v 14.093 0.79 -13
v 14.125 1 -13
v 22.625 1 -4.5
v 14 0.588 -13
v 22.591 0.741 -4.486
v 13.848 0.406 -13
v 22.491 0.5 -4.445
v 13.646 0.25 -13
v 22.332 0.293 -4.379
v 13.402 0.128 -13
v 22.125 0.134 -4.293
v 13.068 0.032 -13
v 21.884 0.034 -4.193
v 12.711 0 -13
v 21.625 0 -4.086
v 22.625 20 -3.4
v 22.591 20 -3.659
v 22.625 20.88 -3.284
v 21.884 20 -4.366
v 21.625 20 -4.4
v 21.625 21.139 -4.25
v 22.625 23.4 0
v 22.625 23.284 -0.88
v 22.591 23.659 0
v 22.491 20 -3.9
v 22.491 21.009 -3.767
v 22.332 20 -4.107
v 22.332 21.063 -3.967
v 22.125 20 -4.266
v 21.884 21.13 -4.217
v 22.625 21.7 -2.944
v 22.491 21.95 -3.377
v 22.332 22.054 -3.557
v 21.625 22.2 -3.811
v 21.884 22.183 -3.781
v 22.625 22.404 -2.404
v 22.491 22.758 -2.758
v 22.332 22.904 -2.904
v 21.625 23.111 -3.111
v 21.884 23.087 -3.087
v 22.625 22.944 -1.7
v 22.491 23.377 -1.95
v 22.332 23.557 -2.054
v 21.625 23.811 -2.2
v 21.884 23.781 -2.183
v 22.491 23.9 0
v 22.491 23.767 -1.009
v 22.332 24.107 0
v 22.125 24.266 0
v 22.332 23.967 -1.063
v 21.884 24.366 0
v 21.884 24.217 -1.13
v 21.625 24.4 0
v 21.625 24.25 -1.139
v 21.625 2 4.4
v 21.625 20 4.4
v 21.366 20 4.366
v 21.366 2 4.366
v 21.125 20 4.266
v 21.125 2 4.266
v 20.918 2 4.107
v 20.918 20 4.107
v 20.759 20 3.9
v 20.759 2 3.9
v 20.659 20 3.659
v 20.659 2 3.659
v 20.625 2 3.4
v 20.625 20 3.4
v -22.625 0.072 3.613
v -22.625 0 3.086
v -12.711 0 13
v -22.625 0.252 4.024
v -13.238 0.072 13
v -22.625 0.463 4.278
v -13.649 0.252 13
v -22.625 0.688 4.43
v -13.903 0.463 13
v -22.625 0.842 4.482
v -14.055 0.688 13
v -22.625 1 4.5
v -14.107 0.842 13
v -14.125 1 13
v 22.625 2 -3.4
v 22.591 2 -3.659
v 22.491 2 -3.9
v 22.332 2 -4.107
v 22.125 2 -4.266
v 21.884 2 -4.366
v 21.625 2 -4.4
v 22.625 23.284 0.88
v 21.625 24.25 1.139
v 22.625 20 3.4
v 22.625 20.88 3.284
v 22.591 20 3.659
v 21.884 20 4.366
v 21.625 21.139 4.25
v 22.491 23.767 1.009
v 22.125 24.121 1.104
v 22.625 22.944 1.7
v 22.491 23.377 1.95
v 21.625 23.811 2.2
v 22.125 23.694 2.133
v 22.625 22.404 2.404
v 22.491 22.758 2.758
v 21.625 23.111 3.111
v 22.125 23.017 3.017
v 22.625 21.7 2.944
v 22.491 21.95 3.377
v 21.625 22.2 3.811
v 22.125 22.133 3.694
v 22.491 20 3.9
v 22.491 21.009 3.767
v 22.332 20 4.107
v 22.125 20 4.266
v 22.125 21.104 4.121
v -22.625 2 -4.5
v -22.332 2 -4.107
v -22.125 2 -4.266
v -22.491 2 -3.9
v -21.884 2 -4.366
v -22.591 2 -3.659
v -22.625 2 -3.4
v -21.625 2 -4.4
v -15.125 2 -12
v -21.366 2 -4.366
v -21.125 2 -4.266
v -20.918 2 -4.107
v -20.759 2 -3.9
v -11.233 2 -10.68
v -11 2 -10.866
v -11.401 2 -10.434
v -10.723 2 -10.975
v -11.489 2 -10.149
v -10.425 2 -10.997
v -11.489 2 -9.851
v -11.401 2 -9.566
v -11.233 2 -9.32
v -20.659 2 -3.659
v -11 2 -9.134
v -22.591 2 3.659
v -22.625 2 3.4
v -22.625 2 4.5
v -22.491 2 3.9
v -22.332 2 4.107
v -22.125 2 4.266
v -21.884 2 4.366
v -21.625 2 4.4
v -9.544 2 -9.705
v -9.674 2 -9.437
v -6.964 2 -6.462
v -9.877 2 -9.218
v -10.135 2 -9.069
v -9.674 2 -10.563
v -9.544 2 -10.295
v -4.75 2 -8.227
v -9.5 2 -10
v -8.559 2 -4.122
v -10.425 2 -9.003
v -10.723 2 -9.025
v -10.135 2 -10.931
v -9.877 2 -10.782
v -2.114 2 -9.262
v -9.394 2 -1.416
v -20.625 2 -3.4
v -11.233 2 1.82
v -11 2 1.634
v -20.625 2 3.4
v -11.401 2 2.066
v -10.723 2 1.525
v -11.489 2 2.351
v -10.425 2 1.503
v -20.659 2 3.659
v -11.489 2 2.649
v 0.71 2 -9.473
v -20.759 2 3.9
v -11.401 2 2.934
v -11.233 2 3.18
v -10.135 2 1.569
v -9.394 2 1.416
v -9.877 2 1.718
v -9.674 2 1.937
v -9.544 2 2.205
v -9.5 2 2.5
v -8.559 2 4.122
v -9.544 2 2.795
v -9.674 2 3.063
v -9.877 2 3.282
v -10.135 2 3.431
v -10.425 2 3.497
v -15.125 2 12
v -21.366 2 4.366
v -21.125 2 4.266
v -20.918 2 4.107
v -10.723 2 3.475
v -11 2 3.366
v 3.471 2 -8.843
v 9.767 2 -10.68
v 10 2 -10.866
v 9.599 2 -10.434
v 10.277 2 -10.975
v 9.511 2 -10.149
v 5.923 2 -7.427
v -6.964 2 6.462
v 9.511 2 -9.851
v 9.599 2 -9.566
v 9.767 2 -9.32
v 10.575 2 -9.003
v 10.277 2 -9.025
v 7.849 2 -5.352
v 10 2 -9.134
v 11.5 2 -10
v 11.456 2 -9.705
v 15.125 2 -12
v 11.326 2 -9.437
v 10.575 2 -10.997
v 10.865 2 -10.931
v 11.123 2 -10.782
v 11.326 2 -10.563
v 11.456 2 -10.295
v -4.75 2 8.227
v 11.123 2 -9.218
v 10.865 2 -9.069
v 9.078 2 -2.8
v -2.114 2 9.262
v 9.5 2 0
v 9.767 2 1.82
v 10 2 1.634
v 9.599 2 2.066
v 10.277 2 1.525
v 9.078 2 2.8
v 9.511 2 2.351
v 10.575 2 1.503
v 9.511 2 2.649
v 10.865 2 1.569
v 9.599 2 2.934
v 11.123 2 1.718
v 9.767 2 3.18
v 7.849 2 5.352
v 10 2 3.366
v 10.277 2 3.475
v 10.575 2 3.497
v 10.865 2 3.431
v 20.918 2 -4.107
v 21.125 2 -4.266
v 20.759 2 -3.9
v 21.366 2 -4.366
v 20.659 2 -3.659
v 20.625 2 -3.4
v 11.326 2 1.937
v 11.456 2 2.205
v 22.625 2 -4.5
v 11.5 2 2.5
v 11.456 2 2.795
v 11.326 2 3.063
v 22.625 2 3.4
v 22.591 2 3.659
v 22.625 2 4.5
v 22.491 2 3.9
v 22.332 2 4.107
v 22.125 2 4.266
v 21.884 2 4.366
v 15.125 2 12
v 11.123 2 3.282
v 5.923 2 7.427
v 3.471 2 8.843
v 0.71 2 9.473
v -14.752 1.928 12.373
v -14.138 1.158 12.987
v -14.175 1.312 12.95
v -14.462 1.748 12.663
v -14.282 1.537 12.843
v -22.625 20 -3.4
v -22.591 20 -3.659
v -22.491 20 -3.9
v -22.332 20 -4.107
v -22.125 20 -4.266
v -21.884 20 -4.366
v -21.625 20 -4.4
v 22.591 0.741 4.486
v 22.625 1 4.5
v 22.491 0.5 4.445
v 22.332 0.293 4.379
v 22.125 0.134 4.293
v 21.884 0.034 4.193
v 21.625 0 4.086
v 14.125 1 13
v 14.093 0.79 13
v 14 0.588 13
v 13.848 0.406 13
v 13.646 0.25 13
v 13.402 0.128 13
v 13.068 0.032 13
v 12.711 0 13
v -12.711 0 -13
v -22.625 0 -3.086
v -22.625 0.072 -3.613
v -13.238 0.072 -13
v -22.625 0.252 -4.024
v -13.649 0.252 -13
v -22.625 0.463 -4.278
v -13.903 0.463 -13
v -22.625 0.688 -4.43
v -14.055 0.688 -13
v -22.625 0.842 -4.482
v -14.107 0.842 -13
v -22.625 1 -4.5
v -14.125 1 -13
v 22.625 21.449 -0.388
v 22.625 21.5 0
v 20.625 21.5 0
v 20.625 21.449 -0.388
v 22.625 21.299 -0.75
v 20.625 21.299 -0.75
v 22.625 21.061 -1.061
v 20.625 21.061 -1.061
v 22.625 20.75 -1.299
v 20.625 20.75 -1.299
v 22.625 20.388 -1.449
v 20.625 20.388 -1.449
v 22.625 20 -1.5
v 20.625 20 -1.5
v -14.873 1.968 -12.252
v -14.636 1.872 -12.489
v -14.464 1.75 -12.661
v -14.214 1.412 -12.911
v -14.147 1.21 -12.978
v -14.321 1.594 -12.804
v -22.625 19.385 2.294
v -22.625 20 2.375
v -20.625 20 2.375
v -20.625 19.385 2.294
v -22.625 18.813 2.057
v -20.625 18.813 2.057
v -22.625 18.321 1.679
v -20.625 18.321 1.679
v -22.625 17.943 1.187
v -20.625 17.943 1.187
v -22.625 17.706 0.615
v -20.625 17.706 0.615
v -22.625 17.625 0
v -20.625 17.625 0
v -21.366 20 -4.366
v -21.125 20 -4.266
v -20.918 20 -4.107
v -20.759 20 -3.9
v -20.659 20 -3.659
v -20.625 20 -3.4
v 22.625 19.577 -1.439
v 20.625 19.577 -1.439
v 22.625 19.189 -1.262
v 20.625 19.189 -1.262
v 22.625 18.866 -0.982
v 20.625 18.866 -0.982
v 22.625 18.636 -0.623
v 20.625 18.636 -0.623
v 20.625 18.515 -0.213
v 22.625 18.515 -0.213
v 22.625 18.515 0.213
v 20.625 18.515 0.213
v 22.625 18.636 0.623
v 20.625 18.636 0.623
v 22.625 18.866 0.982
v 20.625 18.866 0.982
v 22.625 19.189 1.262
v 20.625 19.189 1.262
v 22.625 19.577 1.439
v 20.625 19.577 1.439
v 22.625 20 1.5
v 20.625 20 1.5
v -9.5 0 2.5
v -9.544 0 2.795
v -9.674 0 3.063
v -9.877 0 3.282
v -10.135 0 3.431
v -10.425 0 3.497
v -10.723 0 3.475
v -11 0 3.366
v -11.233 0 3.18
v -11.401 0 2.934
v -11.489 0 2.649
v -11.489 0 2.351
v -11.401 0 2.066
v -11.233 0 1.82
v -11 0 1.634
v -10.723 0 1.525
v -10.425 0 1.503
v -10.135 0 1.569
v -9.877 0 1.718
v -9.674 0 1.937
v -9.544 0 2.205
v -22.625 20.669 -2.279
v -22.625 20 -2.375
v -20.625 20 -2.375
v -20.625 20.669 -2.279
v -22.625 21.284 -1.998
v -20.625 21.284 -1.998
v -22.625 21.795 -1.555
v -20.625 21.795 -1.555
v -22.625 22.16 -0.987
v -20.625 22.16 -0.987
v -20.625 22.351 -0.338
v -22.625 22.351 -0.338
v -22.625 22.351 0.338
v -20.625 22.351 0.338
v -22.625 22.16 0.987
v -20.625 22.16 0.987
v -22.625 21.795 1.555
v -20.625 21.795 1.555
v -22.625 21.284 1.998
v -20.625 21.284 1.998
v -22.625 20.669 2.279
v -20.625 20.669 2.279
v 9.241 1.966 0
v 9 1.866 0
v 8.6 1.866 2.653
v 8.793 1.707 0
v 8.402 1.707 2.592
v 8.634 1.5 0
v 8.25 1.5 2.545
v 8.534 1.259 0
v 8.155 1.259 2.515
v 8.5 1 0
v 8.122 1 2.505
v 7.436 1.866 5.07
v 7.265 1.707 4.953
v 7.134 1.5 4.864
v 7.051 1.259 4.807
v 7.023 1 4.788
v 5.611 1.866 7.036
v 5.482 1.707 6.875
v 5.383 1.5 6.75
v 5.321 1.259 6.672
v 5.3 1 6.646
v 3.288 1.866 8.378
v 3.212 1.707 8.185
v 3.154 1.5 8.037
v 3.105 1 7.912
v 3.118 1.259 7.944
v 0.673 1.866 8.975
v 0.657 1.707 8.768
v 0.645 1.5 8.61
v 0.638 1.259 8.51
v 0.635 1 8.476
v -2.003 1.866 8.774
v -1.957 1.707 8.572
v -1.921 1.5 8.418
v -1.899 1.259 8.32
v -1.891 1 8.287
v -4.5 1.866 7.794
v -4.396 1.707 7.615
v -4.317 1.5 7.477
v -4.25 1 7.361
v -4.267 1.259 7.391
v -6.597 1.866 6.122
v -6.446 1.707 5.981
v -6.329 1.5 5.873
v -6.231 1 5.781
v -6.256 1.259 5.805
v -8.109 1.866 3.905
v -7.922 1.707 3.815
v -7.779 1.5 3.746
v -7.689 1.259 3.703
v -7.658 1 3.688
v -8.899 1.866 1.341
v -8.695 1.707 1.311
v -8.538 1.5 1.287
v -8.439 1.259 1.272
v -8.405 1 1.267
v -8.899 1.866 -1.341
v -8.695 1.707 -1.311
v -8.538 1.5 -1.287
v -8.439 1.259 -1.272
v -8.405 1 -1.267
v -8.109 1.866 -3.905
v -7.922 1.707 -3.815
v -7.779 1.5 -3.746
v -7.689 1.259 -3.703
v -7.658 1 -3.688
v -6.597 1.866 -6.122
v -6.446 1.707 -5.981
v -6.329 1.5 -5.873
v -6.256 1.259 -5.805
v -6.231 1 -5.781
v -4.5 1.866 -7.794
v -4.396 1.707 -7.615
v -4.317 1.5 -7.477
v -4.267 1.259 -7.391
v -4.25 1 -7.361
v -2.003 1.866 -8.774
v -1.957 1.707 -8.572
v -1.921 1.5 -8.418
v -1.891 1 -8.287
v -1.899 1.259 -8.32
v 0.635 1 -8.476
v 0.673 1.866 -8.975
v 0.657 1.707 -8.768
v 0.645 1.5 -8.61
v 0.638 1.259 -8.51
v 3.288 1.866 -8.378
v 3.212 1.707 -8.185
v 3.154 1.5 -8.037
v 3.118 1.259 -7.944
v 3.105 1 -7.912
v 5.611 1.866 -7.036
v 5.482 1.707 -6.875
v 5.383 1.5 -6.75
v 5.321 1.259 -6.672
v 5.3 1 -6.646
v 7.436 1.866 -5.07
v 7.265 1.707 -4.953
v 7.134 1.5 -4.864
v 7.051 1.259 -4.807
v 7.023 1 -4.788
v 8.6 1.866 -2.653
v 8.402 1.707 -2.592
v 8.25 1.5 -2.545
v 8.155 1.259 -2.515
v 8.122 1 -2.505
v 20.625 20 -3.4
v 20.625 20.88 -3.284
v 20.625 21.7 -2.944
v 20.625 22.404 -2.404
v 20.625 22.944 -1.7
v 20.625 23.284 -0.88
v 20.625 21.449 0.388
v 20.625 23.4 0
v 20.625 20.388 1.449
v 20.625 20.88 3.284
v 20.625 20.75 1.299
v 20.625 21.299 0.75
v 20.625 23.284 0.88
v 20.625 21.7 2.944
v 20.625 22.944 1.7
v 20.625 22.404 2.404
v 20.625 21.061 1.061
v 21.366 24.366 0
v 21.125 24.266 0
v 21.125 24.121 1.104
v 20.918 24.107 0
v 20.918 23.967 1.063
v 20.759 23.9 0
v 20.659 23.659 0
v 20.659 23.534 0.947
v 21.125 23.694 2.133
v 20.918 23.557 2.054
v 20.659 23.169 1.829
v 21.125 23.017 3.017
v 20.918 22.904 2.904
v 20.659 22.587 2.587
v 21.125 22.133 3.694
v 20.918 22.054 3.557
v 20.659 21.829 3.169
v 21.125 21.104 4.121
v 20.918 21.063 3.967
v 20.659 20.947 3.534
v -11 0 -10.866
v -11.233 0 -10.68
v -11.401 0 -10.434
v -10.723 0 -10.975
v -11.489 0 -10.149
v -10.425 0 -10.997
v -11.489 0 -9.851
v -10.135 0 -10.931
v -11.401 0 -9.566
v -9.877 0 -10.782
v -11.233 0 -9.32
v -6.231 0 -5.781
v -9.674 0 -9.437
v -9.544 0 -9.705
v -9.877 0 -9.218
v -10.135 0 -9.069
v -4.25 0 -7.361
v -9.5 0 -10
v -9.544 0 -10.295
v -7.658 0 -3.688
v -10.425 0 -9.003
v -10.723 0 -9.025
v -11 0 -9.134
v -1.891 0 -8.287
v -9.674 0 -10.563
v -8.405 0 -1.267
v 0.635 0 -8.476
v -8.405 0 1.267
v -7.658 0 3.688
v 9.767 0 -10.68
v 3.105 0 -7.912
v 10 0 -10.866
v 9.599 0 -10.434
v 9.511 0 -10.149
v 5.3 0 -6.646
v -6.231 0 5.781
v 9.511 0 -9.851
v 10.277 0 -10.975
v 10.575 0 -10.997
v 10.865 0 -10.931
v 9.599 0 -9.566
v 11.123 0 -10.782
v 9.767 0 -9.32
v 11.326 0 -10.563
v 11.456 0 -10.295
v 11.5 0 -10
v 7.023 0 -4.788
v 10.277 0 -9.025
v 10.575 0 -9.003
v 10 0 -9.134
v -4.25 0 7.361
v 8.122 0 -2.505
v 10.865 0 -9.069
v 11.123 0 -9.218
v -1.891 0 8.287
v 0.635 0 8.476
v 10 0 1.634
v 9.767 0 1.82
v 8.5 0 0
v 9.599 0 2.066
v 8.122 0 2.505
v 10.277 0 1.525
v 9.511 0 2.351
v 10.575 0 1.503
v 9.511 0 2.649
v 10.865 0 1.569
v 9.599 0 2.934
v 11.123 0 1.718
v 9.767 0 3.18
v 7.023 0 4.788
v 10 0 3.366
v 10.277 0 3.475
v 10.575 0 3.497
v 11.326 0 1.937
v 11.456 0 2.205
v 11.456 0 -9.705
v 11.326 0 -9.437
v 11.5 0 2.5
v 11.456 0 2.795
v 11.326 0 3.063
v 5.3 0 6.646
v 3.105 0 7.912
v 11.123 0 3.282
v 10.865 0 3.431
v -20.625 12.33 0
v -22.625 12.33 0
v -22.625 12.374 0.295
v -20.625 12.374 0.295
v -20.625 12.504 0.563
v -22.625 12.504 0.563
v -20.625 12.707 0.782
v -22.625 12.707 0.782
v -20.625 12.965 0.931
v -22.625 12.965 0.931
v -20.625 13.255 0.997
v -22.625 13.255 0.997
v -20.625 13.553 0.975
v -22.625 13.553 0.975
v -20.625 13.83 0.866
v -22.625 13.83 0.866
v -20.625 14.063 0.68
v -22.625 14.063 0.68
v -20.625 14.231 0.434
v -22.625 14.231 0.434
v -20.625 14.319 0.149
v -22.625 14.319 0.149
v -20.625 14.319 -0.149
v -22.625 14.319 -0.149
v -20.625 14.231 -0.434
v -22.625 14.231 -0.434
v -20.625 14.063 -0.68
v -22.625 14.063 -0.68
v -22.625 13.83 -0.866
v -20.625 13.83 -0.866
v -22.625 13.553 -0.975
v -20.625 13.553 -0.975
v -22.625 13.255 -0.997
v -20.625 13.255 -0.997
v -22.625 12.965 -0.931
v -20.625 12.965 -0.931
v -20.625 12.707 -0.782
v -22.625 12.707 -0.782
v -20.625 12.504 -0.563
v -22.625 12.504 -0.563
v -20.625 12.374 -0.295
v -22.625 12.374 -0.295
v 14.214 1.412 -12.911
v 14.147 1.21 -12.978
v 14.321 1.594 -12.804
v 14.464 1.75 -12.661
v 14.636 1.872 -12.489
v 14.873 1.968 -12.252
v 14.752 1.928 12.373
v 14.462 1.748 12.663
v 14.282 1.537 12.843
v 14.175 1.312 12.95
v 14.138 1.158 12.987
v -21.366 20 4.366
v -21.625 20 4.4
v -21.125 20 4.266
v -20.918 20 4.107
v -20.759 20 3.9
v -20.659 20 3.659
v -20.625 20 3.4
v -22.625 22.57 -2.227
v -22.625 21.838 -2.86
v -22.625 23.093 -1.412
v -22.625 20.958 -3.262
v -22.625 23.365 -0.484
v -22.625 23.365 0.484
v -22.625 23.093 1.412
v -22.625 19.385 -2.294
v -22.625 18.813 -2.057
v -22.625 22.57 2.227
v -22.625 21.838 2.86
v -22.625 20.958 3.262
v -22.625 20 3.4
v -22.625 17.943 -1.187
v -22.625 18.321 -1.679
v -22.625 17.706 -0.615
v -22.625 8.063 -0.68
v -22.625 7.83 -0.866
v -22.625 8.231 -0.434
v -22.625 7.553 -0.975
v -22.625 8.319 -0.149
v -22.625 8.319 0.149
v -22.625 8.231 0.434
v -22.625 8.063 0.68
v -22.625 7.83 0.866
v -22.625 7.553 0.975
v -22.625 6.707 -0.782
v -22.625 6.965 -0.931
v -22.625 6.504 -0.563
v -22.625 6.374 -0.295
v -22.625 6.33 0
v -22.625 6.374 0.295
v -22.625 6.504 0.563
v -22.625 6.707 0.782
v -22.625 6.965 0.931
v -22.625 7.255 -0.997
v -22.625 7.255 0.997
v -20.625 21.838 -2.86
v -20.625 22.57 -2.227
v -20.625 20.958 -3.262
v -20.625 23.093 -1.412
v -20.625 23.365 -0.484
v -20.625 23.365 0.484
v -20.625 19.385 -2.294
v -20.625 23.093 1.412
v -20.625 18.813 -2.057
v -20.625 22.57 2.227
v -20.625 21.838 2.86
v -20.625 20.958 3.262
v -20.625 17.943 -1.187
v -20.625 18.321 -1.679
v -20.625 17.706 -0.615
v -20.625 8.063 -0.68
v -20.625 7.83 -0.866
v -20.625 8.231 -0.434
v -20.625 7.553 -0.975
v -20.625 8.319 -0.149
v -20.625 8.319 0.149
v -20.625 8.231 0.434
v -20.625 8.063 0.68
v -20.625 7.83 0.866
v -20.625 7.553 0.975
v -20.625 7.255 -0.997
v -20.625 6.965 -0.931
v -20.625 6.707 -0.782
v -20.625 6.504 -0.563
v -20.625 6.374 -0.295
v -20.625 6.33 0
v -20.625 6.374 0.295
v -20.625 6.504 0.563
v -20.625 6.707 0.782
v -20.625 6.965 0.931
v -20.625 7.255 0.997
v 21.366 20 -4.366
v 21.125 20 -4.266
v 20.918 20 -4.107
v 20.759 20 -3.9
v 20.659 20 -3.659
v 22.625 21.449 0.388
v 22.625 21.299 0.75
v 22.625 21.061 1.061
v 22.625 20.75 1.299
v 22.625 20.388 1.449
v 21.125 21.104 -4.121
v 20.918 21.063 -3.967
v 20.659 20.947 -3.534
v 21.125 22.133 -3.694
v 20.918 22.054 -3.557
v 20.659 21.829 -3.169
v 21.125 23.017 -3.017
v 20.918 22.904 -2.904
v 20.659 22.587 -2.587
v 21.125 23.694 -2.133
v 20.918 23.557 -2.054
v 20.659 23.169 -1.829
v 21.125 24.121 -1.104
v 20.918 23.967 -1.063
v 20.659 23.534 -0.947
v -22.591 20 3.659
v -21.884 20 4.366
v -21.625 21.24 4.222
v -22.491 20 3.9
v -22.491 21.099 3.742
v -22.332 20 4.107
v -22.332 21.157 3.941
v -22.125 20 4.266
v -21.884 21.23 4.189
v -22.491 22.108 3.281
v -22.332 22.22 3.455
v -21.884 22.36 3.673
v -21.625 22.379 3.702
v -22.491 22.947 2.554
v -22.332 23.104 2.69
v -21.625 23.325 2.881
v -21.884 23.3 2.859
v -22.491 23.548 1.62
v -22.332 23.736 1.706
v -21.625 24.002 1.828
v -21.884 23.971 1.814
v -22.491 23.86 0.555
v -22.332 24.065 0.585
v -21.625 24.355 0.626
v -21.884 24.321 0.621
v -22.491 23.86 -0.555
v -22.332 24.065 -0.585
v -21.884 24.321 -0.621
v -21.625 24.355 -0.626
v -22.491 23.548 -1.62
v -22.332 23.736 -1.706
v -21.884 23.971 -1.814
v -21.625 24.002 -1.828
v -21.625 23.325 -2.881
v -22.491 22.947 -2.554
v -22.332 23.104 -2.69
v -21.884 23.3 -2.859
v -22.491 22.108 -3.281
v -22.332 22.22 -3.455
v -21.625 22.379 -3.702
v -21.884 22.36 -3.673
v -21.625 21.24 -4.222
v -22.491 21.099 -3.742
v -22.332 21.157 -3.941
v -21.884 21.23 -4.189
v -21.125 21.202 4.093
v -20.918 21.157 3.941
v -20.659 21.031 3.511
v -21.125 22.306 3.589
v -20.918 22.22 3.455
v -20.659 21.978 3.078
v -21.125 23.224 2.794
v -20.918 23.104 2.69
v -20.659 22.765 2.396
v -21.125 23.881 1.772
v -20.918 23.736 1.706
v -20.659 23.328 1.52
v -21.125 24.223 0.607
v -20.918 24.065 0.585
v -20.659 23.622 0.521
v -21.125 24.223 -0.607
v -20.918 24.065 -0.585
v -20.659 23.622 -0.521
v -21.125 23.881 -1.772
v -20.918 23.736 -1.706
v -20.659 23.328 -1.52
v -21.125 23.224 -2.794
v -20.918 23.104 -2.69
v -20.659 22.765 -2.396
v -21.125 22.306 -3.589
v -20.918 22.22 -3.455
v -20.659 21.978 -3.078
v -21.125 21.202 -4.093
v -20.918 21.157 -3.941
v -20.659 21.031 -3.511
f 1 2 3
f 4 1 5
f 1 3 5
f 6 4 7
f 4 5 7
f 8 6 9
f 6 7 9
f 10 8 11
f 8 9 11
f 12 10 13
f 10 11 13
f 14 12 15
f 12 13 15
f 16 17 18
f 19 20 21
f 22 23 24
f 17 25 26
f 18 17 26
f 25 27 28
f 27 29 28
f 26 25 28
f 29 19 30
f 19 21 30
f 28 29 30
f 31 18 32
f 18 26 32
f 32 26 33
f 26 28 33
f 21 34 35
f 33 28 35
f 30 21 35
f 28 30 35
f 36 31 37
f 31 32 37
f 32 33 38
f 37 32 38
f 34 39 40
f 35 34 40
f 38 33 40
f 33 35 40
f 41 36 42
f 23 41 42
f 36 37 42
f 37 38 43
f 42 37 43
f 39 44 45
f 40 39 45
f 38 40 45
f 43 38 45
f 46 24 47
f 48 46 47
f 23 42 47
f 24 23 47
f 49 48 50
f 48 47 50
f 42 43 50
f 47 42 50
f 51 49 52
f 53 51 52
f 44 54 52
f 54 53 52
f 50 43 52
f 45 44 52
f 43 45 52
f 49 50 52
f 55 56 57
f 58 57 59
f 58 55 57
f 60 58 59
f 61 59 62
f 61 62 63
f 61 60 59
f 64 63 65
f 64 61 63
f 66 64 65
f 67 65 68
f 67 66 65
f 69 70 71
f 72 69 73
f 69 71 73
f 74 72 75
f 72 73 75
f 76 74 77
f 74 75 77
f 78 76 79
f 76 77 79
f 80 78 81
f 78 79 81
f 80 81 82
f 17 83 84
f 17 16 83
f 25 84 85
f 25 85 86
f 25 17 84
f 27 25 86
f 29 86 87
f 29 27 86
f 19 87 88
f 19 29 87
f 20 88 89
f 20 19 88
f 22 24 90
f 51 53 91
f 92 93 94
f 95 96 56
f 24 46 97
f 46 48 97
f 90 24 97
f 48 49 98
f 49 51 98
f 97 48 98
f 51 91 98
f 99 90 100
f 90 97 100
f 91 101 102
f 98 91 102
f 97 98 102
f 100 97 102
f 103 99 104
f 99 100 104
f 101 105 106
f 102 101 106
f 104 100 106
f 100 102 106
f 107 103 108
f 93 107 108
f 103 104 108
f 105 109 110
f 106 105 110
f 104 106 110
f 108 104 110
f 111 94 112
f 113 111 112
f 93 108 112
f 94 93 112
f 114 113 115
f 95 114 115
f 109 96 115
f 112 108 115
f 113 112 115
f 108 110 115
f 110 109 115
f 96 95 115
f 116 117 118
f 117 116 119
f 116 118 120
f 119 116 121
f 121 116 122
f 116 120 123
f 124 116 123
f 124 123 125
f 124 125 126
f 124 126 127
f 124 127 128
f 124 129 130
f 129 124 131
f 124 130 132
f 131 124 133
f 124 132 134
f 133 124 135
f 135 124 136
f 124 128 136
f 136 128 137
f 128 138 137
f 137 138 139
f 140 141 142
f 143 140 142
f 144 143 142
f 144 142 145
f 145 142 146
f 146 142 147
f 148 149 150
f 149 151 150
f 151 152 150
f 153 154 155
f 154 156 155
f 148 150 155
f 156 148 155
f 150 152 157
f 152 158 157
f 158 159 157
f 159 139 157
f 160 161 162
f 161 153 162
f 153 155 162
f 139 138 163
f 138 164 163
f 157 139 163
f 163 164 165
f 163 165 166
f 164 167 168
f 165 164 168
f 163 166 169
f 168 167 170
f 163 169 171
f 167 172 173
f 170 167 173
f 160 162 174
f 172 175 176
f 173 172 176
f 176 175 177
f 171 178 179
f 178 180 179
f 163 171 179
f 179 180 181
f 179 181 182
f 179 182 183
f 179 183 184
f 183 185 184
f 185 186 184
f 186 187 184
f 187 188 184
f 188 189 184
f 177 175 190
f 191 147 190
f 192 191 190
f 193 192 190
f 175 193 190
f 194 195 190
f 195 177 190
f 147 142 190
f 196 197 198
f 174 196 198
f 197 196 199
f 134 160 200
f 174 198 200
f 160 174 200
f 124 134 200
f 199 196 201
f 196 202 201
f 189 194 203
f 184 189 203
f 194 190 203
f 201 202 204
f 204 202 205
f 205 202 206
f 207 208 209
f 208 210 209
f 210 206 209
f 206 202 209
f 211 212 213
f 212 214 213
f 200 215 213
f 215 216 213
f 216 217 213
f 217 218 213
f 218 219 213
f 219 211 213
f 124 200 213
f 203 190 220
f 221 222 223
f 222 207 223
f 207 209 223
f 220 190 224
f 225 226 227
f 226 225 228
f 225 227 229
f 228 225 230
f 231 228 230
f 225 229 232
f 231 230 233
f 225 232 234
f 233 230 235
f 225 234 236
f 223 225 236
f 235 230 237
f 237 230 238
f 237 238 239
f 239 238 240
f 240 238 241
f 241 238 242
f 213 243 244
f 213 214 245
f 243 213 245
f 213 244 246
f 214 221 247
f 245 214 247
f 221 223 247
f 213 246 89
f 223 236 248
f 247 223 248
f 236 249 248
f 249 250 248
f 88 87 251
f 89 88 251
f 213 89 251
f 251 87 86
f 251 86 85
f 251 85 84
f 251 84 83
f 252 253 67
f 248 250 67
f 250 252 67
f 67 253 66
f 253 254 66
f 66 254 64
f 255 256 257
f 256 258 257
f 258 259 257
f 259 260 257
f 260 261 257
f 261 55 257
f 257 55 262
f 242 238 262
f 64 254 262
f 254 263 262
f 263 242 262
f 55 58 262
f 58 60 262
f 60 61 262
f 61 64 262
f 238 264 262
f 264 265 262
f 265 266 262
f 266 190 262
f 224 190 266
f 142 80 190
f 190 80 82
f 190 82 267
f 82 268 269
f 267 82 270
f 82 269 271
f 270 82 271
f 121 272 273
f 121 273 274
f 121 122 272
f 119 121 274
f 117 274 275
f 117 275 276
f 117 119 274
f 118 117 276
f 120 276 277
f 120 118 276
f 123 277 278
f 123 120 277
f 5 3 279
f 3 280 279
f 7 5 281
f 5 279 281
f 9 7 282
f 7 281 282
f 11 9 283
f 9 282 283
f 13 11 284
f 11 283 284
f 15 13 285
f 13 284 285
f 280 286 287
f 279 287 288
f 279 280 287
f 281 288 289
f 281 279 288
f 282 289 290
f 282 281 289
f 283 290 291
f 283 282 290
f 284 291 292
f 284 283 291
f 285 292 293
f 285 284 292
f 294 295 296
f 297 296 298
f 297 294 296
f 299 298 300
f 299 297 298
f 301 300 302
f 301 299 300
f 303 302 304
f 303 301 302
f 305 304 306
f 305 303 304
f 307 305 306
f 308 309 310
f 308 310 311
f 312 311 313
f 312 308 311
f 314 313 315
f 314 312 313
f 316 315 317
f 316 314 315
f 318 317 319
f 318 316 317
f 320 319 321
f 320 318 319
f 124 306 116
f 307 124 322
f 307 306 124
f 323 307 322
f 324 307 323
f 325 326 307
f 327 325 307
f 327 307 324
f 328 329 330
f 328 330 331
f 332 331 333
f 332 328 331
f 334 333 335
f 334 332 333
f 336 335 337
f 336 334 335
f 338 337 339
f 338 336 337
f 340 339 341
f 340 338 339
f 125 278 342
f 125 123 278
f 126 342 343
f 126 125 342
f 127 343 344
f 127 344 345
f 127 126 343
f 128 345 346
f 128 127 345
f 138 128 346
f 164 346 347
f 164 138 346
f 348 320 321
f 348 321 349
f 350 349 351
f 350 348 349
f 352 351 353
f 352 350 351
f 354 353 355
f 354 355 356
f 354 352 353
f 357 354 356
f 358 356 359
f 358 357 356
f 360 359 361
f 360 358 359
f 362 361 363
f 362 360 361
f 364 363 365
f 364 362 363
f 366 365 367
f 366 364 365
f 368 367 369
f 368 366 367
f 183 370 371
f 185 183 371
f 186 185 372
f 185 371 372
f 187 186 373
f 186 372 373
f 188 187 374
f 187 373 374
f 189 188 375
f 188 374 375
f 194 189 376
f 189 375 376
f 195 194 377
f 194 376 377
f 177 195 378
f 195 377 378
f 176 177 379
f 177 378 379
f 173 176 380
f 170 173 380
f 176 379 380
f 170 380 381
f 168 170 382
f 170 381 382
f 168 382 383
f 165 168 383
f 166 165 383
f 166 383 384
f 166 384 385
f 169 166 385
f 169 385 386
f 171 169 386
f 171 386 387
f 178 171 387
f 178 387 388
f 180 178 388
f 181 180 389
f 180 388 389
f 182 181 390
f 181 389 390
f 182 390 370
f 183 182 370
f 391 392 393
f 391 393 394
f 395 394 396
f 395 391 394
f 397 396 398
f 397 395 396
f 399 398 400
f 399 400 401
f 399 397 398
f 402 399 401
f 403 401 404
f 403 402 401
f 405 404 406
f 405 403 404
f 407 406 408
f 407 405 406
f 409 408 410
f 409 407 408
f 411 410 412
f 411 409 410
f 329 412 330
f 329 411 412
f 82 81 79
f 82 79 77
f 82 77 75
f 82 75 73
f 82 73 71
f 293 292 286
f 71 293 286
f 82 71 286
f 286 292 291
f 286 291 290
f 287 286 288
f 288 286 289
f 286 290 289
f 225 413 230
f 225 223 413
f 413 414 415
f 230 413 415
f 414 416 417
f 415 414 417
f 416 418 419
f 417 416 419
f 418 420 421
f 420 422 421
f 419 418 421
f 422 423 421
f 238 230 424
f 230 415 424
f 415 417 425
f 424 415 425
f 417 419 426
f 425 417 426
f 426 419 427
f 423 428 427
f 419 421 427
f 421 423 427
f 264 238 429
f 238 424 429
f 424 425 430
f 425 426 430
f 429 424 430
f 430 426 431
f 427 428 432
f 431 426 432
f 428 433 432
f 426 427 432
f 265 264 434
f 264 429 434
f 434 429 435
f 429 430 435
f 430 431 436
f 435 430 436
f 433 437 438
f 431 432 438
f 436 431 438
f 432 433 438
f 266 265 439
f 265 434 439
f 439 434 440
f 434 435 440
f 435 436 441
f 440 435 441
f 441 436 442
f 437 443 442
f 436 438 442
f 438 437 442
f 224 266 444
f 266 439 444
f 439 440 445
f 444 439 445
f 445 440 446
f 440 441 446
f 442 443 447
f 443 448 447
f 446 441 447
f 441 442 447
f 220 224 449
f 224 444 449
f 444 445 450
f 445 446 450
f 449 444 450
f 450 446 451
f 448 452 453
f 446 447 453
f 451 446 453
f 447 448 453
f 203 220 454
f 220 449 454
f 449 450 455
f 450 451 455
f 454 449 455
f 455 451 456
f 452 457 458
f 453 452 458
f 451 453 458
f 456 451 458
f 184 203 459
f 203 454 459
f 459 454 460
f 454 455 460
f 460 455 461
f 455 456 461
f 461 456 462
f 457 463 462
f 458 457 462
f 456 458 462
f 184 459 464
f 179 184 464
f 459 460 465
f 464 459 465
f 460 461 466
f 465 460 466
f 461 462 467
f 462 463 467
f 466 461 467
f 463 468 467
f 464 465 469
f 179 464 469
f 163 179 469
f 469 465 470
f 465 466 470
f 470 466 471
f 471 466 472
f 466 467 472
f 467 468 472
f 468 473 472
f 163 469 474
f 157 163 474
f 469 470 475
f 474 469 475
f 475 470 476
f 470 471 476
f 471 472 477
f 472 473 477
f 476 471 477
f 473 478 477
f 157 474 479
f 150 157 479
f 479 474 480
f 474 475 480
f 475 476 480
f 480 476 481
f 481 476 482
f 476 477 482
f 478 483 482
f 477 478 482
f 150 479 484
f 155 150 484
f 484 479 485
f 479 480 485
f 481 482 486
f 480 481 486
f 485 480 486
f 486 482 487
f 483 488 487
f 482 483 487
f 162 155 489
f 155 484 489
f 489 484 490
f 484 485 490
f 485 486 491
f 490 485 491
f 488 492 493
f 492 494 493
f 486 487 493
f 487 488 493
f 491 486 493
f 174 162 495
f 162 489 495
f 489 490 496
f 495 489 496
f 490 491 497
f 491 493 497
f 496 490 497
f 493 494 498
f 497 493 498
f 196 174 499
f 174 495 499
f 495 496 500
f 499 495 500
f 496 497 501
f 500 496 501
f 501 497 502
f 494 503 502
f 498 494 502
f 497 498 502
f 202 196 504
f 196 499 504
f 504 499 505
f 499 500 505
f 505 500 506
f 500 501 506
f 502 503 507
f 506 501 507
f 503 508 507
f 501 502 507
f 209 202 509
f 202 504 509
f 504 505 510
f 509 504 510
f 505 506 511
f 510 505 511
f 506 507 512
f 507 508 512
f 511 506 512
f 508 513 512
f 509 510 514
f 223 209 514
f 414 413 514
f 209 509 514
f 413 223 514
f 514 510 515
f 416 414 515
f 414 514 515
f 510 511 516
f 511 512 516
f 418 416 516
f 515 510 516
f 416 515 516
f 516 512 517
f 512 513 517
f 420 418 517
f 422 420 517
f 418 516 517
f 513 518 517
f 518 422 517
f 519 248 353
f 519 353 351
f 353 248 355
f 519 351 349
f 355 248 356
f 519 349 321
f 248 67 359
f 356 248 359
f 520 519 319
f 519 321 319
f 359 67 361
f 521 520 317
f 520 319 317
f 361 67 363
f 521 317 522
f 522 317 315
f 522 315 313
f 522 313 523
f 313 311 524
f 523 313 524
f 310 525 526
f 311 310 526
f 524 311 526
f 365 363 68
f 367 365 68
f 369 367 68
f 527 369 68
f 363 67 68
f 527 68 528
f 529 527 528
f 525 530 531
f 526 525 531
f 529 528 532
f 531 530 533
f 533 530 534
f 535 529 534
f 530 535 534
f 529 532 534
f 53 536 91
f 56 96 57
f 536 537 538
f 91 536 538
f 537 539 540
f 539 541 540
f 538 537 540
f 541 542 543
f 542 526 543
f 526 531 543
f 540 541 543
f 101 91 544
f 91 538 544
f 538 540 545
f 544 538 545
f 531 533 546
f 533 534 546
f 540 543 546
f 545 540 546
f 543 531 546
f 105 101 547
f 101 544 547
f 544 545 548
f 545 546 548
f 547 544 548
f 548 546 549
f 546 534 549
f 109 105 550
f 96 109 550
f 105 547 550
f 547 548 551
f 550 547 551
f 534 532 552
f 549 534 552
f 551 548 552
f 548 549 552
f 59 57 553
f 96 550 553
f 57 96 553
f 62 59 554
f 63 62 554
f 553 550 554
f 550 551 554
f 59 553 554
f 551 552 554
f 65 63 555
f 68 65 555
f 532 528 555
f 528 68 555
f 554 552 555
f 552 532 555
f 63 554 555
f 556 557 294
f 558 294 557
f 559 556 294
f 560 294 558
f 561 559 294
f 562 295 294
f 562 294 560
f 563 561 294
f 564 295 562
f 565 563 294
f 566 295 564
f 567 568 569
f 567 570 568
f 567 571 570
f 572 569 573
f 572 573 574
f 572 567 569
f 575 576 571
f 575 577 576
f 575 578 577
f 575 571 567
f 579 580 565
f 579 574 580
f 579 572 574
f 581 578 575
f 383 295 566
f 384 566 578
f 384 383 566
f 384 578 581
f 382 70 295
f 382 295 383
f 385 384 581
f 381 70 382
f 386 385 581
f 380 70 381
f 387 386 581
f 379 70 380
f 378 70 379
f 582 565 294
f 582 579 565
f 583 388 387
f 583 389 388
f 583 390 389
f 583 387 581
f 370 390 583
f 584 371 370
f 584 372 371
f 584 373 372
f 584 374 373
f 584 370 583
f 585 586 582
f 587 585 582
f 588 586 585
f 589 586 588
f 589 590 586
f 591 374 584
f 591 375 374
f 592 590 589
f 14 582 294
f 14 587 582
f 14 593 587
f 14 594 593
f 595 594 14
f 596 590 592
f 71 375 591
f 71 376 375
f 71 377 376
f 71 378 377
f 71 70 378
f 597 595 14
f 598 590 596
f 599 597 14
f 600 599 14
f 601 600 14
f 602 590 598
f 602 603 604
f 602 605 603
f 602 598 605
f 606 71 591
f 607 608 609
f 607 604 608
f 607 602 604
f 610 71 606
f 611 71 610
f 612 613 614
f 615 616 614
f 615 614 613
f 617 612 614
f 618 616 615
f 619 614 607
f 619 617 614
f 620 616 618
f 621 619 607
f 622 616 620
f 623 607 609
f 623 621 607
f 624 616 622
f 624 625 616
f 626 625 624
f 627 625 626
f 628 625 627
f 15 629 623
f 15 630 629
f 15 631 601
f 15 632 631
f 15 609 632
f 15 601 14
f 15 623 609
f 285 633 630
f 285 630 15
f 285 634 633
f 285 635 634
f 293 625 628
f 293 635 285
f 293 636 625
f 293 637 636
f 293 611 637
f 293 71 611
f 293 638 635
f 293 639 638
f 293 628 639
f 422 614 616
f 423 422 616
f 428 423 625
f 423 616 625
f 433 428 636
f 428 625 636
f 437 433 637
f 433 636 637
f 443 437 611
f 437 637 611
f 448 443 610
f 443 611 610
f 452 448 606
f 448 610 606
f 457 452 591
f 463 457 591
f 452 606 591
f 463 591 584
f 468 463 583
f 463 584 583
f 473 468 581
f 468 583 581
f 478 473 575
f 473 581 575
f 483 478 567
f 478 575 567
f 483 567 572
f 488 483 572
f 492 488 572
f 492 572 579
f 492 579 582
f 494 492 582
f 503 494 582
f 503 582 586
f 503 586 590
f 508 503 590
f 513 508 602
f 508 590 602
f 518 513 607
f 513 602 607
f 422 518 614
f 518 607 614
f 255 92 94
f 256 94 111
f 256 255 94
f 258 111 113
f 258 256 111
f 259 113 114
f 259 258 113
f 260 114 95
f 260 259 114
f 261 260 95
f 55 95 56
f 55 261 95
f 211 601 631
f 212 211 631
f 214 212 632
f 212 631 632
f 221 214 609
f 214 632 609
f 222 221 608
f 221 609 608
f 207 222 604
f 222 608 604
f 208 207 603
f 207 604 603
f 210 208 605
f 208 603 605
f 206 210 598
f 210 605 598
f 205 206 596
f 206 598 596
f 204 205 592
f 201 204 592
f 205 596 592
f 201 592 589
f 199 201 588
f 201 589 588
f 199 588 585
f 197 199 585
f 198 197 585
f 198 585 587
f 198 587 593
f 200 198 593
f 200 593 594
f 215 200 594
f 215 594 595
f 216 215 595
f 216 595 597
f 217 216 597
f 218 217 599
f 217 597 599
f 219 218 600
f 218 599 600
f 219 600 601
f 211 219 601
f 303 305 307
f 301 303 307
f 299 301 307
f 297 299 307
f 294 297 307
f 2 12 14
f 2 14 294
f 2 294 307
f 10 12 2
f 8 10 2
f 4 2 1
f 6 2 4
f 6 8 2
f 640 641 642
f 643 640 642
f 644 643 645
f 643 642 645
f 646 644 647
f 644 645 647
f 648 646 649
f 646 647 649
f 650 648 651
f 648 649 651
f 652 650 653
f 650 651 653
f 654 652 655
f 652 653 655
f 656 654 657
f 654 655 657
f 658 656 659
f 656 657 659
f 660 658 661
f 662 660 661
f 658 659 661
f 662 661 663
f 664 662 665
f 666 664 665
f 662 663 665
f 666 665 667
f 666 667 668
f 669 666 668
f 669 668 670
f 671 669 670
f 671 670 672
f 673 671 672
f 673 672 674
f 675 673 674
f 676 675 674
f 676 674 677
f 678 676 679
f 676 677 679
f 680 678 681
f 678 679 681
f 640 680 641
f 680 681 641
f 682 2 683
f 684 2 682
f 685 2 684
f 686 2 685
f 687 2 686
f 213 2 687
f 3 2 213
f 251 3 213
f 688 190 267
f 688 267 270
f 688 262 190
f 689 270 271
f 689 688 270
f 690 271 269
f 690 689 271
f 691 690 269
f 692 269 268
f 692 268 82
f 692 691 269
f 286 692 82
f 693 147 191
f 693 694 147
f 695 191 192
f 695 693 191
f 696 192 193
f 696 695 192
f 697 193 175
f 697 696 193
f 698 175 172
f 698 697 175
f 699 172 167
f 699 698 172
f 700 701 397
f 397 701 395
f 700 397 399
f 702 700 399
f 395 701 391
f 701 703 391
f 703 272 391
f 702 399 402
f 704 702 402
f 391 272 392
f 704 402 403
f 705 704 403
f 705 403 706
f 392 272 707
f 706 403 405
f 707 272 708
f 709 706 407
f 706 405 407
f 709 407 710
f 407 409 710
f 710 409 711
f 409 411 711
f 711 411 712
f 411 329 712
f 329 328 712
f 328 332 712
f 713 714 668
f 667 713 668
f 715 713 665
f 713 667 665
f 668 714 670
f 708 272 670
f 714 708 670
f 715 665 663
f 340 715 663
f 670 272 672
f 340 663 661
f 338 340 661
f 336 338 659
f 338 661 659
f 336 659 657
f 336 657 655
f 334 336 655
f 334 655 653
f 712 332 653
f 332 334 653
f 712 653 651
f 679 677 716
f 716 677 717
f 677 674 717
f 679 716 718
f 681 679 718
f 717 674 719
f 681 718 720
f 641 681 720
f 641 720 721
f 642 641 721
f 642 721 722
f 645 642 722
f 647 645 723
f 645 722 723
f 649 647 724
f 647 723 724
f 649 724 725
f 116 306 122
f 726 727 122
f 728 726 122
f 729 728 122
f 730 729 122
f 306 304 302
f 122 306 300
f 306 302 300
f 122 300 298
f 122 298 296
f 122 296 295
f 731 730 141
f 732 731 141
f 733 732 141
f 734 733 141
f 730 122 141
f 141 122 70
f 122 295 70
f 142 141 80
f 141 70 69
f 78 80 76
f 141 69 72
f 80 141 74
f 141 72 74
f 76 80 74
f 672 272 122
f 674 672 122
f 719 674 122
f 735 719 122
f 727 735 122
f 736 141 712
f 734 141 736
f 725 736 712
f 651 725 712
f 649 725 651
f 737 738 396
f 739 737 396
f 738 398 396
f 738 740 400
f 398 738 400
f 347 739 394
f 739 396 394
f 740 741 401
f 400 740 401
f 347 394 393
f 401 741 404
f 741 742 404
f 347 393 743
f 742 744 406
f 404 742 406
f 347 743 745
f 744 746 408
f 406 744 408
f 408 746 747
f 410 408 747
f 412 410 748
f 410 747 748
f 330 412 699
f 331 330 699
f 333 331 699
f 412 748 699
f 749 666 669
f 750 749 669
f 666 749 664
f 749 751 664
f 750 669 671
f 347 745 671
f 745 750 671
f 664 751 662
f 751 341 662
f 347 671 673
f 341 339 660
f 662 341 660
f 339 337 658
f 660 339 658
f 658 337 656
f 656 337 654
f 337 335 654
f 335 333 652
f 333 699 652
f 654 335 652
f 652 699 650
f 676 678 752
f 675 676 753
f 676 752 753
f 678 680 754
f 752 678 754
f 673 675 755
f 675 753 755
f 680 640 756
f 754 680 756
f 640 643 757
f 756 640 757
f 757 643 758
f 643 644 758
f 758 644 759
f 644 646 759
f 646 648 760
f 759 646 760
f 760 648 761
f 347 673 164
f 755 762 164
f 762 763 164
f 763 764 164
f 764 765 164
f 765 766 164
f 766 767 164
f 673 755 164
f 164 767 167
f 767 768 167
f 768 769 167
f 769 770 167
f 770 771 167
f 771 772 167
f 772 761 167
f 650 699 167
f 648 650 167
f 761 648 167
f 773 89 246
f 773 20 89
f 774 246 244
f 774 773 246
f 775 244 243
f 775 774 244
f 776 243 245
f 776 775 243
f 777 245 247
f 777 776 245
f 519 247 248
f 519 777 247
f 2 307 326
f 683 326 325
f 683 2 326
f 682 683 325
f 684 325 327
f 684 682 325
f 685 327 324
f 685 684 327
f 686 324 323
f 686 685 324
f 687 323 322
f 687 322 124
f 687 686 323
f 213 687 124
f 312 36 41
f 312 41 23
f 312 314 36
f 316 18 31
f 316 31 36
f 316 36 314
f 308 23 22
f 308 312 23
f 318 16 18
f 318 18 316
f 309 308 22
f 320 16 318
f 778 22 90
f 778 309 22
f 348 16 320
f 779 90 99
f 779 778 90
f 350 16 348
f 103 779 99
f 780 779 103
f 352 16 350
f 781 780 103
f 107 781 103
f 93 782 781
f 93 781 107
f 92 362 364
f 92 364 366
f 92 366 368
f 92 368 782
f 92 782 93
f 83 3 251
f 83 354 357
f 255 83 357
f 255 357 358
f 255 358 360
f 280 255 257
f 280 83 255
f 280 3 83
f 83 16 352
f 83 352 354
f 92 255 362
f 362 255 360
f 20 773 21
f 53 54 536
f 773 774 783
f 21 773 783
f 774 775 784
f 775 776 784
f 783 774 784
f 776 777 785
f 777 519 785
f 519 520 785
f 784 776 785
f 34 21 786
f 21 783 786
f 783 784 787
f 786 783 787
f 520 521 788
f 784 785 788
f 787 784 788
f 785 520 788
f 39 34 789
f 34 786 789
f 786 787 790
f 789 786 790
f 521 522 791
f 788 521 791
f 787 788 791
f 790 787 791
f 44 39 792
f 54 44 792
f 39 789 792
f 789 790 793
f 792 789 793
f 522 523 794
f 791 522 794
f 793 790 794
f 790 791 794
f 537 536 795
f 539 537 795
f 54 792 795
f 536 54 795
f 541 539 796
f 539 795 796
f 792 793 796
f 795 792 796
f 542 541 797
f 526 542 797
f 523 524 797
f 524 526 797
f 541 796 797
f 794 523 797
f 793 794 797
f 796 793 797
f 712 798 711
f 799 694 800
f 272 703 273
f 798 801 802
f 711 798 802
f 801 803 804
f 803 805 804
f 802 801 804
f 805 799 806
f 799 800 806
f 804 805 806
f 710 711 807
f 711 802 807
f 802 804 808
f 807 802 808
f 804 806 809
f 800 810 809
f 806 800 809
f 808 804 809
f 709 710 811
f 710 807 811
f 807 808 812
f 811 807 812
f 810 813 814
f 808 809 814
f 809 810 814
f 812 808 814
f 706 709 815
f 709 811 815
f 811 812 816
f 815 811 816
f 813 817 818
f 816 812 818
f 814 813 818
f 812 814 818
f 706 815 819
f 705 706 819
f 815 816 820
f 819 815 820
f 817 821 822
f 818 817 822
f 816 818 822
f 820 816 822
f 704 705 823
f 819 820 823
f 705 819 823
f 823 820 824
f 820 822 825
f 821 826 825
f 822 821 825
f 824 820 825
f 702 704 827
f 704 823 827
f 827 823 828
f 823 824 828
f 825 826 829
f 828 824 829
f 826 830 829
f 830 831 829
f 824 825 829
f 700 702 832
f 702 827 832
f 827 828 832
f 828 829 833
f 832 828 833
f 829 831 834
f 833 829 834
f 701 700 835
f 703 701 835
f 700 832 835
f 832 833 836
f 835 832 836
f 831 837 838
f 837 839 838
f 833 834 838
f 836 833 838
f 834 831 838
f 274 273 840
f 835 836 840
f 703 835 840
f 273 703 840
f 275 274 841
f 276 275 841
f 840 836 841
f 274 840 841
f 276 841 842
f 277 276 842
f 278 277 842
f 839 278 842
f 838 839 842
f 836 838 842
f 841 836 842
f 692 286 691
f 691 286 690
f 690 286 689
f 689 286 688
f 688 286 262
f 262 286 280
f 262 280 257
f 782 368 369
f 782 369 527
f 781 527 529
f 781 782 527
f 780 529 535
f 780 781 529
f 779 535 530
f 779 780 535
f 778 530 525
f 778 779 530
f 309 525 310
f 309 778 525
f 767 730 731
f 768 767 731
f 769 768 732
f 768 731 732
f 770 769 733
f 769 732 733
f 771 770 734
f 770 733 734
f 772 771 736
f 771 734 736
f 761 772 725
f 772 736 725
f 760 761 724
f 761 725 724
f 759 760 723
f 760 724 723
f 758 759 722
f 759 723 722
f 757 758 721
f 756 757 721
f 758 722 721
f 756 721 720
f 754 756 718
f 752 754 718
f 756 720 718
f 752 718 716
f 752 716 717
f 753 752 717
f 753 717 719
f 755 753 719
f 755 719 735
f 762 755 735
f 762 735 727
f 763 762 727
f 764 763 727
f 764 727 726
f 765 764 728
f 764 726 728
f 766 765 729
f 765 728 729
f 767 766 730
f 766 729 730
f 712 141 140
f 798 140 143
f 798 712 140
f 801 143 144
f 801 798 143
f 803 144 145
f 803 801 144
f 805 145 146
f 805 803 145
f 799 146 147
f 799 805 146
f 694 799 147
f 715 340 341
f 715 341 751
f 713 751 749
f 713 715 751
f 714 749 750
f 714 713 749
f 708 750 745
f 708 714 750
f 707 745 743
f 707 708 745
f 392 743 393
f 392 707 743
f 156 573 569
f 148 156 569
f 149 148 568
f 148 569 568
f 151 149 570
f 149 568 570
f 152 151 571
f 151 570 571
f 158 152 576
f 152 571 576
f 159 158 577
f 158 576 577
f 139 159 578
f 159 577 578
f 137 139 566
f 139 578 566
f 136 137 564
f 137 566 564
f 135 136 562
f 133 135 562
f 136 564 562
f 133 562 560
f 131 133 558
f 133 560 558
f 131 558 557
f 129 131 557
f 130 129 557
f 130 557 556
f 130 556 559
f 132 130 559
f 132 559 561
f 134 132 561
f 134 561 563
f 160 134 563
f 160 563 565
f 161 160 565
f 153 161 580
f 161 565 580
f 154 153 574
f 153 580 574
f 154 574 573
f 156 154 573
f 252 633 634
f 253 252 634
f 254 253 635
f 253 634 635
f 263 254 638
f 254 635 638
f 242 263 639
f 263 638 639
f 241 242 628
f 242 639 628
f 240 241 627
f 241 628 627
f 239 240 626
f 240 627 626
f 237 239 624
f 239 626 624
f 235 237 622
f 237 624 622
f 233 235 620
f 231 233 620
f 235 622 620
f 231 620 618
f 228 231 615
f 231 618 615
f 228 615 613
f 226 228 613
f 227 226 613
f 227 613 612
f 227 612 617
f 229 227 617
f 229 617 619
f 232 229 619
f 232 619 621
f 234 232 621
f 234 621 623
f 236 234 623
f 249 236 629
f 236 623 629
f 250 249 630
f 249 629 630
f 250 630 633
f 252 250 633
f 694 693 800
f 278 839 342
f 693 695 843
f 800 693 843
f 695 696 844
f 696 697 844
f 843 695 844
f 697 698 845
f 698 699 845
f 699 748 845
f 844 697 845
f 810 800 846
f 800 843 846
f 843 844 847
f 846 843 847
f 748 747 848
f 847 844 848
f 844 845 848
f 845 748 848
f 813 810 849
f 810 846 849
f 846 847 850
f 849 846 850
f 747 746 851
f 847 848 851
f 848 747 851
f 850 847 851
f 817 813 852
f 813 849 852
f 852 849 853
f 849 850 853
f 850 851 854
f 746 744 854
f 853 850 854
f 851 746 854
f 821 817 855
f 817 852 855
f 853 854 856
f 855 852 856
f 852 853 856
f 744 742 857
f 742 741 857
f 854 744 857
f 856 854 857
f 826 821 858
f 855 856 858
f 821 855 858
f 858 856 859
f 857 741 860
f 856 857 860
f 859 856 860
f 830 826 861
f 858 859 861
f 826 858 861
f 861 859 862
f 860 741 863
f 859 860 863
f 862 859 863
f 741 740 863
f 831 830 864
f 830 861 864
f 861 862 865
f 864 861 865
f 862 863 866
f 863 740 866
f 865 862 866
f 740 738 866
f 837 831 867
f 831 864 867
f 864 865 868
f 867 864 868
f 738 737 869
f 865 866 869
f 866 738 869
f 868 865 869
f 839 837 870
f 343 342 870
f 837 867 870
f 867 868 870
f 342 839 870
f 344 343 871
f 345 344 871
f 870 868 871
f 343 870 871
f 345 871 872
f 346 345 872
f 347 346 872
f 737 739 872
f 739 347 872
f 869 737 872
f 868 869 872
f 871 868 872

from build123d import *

# Parameters (mm, degrees)
F0_W     = 45.25
F0_H     = 26
F0_W_2   = 25
F0_H_2   = 24
F0_R     = 1
F0_R_2   = 8.5
F1_DEPTH = 2
F3_DEPTH = 2
F4_R     = 1
F5_DEPTH = 2
F6_SIZE  = 8.5
F7_R     = 1
F7_R_2   = 0.99999


# Not quite as in the source:
# - a fillet or chamfer is up to 0.001 mm smaller than in the source, because OpenCascade refuses the exact size


with BuildPart() as f1:
    # F0 (on Front) → F1 (new body)
    with BuildSketch(Plane.XZ):
        Rectangle(F0_W, F0_H)
        Rectangle(F0_W_2, F0_H_2, mode=Mode.SUBTRACT)
        Rectangle(F0_W_2, F0_H_2)
        with Locations((-10.5, -10)):
            Circle(F0_R, mode=Mode.SUBTRACT)
        with Locations((10.5, -10)):
            Circle(F0_R, mode=Mode.SUBTRACT)
        with Locations((-10.5, 2.5)):
            Circle(F0_R, mode=Mode.SUBTRACT)
        Circle(F0_R_2, mode=Mode.SUBTRACT)
        with Locations((10.5, 2.5)):
            Circle(F0_R, mode=Mode.SUBTRACT)
    extrude(amount=-F1_DEPTH)

    # F2 (on face) → F3 (join)
    with BuildSketch(Plane.YZ.offset(22.625)):
        with BuildLine():
            ThreePointArc((20, -4.4), (15.6, 0), (20, 4.4))
            Line((20, 4.4), (2, 4.4))
            Line((2, 4.4), (2, -4.4))
            Line((2, -4.4), (20, -4.4))
        make_face()
        with BuildLine():
            ThreePointArc((20, 1.5), (21.0606601718, 1.0606601718), (21.5, 0))
            ThreePointArc((21.5, 0), (21.0606601718, -1.0606601718), (20, -1.5))
            Line((20, -1.5), (20, -4.4))
            ThreePointArc((20, -4.4), (23.1112698372, -3.1112698372), (24.4, 0))
            ThreePointArc((24.4, 0), (23.1112698372, 3.1112698372), (20, 4.4))
            Line((20, 4.4), (20, 1.5))
        make_face()
        with BuildLine():
            ThreePointArc((20, -1.5), (18.5, 0), (20, 1.5))
            Line((20, 1.5), (20, 4.4))
            ThreePointArc((20, 4.4), (15.6, 0), (20, -4.4))
            Line((20, -4.4), (20, -1.5))
        make_face()
    extrude(amount=-F3_DEPTH)

    # F4 (on face) → F5 (join)
    with BuildSketch(Plane(origin=(-22.625, 0, 0), x_dir=(0, -1, 0), z_dir=(-1, 0, 0))):
        with BuildLine():
            ThreePointArc((-20, -2.375), (-22.375, 0), (-20, 2.375))
            Line((-20, 2.375), (-20, 4.4))
            ThreePointArc((-20, 4.4), (-24.4, 0), (-20, -4.4))
            Line((-20, -4.4), (-20, -2.375))
        make_face()
        with BuildLine():
            ThreePointArc((-20, 2.375), (-18.3206213947, 1.6793786053), (-17.625, 0))
            ThreePointArc((-17.625, 0), (-18.3206213947, -1.6793786053), (-20, -2.375))
            Line((-20, -2.375), (-20, -4.4))
            ThreePointArc((-20, -4.4), (-16.8887301628, -3.1112698372), (-15.6, 0))
            ThreePointArc((-15.6, 0), (-16.8887301628, 3.1112698372), (-20, 4.4))
            Line((-20, 4.4), (-20, 2.375))
        make_face()
        with BuildLine():
            Line((-2, 4.4), (-20, 4.4))
            ThreePointArc((-20, 4.4), (-16.8887301628, 3.1112698372), (-15.6, 0))
            ThreePointArc((-15.6, 0), (-16.8887301628, -3.1112698372), (-20, -4.4))
            Line((-20, -4.4), (-2, -4.4))
            Line((-2, -4.4), (-2, 4.4))
        make_face()
        with Locations((-13.33, 0)):
            Circle(F4_R, mode=Mode.SUBTRACT)
        with Locations((-7.33, 0)):
            Circle(F4_R, mode=Mode.SUBTRACT)
    extrude(amount=-F5_DEPTH)

    # F6
    f6_edges = [f1.edges().sort_by_distance(p)[0] for p in [
        (22.625, 1, 13),
        (-22.625, 1, 13),
        (-22.625, 1, -13),
        (22.625, 1, -13),
    ]]
    chamfer(f6_edges, length=F6_SIZE)

    # F7 (call 1 of 10: OpenCascade refuses the feature's edges together)
    f7_edges = [f1.edges().sort_by_distance(p)[0] for p in [
        (-8.5, 2, 0),
    ]]
    fillet(f7_edges, radius=F7_R)

    # F7#2 (call 2 of 10)
    f7_2_edges = [f1.edges().sort_by_distance(p)[0] for p in [
        (18.375, 0, 8.75),
        (18.375, 0, -8.75),
        (22.625, 0, 0),
    ]]
    fillet(f7_2_edges, radius=F7_R)

    # F7#3 (call 3 of 10)
    f7_3_edges = [f1.edges().sort_by_distance(p)[0] for p in [
        (-18.375, 0, -8.75),
    ]]
    fillet(f7_3_edges, radius=F7_R)

    # F7#4 (call 4 of 10)
    f7_4_edges = [f1.edges().sort_by_distance(p)[0] for p in [
        (-18.375, 0, 8.75),
    ]]
    fillet(f7_4_edges, radius=F7_R)

    # F7#5 (call 5 of 10)
    f7_5_edges = [f1.edges().sort_by_distance(p)[0] for p in [
        (-22.625, 11, -4.4),
    ]]
    fillet(f7_5_edges, radius=F7_R)

    # F7#6 (call 6 of 10)
    f7_6_edges = [f1.edges().sort_by_distance(p)[0] for p in [
        (22.625, 11, 4.4),
    ]]
    fillet(f7_6_edges, radius=F7_R)

    # F7#7 (call 7 of 10)
    f7_7_edges = [f1.edges().sort_by_distance(p)[0] for p in [
        (0, 2, -13),
    ]]
    fillet(f7_7_edges, radius=F7_R)

    # F7#8 (call 8 of 10)
    f7_8_edges = [f1.edges().sort_by_distance(p)[0] for p in [
        (0, 2, 13),
    ]]
    fillet(f7_8_edges, radius=F7_R)

    # F7#9 (call 9 of 10) (radius 1 in the source; OpenCascade refuses exactly that, so slightly less here)
    f7_9_edges = [f1.edges().sort_by_distance(p)[0] for p in [
        (-20.625, 11, 4.4),
    ]]
    fillet(f7_9_edges, radius=F7_R_2)

    # F7#10 (call 10 of 10) (radius 1 in the source; OpenCascade refuses exactly that, so slightly less here)
    f7_10_edges = [f1.edges().sort_by_distance(p)[0] for p in [
        (20.625, 11, 4.4),
    ]]
    fillet(f7_10_edges, radius=F7_R_2)


solid = f1.part
